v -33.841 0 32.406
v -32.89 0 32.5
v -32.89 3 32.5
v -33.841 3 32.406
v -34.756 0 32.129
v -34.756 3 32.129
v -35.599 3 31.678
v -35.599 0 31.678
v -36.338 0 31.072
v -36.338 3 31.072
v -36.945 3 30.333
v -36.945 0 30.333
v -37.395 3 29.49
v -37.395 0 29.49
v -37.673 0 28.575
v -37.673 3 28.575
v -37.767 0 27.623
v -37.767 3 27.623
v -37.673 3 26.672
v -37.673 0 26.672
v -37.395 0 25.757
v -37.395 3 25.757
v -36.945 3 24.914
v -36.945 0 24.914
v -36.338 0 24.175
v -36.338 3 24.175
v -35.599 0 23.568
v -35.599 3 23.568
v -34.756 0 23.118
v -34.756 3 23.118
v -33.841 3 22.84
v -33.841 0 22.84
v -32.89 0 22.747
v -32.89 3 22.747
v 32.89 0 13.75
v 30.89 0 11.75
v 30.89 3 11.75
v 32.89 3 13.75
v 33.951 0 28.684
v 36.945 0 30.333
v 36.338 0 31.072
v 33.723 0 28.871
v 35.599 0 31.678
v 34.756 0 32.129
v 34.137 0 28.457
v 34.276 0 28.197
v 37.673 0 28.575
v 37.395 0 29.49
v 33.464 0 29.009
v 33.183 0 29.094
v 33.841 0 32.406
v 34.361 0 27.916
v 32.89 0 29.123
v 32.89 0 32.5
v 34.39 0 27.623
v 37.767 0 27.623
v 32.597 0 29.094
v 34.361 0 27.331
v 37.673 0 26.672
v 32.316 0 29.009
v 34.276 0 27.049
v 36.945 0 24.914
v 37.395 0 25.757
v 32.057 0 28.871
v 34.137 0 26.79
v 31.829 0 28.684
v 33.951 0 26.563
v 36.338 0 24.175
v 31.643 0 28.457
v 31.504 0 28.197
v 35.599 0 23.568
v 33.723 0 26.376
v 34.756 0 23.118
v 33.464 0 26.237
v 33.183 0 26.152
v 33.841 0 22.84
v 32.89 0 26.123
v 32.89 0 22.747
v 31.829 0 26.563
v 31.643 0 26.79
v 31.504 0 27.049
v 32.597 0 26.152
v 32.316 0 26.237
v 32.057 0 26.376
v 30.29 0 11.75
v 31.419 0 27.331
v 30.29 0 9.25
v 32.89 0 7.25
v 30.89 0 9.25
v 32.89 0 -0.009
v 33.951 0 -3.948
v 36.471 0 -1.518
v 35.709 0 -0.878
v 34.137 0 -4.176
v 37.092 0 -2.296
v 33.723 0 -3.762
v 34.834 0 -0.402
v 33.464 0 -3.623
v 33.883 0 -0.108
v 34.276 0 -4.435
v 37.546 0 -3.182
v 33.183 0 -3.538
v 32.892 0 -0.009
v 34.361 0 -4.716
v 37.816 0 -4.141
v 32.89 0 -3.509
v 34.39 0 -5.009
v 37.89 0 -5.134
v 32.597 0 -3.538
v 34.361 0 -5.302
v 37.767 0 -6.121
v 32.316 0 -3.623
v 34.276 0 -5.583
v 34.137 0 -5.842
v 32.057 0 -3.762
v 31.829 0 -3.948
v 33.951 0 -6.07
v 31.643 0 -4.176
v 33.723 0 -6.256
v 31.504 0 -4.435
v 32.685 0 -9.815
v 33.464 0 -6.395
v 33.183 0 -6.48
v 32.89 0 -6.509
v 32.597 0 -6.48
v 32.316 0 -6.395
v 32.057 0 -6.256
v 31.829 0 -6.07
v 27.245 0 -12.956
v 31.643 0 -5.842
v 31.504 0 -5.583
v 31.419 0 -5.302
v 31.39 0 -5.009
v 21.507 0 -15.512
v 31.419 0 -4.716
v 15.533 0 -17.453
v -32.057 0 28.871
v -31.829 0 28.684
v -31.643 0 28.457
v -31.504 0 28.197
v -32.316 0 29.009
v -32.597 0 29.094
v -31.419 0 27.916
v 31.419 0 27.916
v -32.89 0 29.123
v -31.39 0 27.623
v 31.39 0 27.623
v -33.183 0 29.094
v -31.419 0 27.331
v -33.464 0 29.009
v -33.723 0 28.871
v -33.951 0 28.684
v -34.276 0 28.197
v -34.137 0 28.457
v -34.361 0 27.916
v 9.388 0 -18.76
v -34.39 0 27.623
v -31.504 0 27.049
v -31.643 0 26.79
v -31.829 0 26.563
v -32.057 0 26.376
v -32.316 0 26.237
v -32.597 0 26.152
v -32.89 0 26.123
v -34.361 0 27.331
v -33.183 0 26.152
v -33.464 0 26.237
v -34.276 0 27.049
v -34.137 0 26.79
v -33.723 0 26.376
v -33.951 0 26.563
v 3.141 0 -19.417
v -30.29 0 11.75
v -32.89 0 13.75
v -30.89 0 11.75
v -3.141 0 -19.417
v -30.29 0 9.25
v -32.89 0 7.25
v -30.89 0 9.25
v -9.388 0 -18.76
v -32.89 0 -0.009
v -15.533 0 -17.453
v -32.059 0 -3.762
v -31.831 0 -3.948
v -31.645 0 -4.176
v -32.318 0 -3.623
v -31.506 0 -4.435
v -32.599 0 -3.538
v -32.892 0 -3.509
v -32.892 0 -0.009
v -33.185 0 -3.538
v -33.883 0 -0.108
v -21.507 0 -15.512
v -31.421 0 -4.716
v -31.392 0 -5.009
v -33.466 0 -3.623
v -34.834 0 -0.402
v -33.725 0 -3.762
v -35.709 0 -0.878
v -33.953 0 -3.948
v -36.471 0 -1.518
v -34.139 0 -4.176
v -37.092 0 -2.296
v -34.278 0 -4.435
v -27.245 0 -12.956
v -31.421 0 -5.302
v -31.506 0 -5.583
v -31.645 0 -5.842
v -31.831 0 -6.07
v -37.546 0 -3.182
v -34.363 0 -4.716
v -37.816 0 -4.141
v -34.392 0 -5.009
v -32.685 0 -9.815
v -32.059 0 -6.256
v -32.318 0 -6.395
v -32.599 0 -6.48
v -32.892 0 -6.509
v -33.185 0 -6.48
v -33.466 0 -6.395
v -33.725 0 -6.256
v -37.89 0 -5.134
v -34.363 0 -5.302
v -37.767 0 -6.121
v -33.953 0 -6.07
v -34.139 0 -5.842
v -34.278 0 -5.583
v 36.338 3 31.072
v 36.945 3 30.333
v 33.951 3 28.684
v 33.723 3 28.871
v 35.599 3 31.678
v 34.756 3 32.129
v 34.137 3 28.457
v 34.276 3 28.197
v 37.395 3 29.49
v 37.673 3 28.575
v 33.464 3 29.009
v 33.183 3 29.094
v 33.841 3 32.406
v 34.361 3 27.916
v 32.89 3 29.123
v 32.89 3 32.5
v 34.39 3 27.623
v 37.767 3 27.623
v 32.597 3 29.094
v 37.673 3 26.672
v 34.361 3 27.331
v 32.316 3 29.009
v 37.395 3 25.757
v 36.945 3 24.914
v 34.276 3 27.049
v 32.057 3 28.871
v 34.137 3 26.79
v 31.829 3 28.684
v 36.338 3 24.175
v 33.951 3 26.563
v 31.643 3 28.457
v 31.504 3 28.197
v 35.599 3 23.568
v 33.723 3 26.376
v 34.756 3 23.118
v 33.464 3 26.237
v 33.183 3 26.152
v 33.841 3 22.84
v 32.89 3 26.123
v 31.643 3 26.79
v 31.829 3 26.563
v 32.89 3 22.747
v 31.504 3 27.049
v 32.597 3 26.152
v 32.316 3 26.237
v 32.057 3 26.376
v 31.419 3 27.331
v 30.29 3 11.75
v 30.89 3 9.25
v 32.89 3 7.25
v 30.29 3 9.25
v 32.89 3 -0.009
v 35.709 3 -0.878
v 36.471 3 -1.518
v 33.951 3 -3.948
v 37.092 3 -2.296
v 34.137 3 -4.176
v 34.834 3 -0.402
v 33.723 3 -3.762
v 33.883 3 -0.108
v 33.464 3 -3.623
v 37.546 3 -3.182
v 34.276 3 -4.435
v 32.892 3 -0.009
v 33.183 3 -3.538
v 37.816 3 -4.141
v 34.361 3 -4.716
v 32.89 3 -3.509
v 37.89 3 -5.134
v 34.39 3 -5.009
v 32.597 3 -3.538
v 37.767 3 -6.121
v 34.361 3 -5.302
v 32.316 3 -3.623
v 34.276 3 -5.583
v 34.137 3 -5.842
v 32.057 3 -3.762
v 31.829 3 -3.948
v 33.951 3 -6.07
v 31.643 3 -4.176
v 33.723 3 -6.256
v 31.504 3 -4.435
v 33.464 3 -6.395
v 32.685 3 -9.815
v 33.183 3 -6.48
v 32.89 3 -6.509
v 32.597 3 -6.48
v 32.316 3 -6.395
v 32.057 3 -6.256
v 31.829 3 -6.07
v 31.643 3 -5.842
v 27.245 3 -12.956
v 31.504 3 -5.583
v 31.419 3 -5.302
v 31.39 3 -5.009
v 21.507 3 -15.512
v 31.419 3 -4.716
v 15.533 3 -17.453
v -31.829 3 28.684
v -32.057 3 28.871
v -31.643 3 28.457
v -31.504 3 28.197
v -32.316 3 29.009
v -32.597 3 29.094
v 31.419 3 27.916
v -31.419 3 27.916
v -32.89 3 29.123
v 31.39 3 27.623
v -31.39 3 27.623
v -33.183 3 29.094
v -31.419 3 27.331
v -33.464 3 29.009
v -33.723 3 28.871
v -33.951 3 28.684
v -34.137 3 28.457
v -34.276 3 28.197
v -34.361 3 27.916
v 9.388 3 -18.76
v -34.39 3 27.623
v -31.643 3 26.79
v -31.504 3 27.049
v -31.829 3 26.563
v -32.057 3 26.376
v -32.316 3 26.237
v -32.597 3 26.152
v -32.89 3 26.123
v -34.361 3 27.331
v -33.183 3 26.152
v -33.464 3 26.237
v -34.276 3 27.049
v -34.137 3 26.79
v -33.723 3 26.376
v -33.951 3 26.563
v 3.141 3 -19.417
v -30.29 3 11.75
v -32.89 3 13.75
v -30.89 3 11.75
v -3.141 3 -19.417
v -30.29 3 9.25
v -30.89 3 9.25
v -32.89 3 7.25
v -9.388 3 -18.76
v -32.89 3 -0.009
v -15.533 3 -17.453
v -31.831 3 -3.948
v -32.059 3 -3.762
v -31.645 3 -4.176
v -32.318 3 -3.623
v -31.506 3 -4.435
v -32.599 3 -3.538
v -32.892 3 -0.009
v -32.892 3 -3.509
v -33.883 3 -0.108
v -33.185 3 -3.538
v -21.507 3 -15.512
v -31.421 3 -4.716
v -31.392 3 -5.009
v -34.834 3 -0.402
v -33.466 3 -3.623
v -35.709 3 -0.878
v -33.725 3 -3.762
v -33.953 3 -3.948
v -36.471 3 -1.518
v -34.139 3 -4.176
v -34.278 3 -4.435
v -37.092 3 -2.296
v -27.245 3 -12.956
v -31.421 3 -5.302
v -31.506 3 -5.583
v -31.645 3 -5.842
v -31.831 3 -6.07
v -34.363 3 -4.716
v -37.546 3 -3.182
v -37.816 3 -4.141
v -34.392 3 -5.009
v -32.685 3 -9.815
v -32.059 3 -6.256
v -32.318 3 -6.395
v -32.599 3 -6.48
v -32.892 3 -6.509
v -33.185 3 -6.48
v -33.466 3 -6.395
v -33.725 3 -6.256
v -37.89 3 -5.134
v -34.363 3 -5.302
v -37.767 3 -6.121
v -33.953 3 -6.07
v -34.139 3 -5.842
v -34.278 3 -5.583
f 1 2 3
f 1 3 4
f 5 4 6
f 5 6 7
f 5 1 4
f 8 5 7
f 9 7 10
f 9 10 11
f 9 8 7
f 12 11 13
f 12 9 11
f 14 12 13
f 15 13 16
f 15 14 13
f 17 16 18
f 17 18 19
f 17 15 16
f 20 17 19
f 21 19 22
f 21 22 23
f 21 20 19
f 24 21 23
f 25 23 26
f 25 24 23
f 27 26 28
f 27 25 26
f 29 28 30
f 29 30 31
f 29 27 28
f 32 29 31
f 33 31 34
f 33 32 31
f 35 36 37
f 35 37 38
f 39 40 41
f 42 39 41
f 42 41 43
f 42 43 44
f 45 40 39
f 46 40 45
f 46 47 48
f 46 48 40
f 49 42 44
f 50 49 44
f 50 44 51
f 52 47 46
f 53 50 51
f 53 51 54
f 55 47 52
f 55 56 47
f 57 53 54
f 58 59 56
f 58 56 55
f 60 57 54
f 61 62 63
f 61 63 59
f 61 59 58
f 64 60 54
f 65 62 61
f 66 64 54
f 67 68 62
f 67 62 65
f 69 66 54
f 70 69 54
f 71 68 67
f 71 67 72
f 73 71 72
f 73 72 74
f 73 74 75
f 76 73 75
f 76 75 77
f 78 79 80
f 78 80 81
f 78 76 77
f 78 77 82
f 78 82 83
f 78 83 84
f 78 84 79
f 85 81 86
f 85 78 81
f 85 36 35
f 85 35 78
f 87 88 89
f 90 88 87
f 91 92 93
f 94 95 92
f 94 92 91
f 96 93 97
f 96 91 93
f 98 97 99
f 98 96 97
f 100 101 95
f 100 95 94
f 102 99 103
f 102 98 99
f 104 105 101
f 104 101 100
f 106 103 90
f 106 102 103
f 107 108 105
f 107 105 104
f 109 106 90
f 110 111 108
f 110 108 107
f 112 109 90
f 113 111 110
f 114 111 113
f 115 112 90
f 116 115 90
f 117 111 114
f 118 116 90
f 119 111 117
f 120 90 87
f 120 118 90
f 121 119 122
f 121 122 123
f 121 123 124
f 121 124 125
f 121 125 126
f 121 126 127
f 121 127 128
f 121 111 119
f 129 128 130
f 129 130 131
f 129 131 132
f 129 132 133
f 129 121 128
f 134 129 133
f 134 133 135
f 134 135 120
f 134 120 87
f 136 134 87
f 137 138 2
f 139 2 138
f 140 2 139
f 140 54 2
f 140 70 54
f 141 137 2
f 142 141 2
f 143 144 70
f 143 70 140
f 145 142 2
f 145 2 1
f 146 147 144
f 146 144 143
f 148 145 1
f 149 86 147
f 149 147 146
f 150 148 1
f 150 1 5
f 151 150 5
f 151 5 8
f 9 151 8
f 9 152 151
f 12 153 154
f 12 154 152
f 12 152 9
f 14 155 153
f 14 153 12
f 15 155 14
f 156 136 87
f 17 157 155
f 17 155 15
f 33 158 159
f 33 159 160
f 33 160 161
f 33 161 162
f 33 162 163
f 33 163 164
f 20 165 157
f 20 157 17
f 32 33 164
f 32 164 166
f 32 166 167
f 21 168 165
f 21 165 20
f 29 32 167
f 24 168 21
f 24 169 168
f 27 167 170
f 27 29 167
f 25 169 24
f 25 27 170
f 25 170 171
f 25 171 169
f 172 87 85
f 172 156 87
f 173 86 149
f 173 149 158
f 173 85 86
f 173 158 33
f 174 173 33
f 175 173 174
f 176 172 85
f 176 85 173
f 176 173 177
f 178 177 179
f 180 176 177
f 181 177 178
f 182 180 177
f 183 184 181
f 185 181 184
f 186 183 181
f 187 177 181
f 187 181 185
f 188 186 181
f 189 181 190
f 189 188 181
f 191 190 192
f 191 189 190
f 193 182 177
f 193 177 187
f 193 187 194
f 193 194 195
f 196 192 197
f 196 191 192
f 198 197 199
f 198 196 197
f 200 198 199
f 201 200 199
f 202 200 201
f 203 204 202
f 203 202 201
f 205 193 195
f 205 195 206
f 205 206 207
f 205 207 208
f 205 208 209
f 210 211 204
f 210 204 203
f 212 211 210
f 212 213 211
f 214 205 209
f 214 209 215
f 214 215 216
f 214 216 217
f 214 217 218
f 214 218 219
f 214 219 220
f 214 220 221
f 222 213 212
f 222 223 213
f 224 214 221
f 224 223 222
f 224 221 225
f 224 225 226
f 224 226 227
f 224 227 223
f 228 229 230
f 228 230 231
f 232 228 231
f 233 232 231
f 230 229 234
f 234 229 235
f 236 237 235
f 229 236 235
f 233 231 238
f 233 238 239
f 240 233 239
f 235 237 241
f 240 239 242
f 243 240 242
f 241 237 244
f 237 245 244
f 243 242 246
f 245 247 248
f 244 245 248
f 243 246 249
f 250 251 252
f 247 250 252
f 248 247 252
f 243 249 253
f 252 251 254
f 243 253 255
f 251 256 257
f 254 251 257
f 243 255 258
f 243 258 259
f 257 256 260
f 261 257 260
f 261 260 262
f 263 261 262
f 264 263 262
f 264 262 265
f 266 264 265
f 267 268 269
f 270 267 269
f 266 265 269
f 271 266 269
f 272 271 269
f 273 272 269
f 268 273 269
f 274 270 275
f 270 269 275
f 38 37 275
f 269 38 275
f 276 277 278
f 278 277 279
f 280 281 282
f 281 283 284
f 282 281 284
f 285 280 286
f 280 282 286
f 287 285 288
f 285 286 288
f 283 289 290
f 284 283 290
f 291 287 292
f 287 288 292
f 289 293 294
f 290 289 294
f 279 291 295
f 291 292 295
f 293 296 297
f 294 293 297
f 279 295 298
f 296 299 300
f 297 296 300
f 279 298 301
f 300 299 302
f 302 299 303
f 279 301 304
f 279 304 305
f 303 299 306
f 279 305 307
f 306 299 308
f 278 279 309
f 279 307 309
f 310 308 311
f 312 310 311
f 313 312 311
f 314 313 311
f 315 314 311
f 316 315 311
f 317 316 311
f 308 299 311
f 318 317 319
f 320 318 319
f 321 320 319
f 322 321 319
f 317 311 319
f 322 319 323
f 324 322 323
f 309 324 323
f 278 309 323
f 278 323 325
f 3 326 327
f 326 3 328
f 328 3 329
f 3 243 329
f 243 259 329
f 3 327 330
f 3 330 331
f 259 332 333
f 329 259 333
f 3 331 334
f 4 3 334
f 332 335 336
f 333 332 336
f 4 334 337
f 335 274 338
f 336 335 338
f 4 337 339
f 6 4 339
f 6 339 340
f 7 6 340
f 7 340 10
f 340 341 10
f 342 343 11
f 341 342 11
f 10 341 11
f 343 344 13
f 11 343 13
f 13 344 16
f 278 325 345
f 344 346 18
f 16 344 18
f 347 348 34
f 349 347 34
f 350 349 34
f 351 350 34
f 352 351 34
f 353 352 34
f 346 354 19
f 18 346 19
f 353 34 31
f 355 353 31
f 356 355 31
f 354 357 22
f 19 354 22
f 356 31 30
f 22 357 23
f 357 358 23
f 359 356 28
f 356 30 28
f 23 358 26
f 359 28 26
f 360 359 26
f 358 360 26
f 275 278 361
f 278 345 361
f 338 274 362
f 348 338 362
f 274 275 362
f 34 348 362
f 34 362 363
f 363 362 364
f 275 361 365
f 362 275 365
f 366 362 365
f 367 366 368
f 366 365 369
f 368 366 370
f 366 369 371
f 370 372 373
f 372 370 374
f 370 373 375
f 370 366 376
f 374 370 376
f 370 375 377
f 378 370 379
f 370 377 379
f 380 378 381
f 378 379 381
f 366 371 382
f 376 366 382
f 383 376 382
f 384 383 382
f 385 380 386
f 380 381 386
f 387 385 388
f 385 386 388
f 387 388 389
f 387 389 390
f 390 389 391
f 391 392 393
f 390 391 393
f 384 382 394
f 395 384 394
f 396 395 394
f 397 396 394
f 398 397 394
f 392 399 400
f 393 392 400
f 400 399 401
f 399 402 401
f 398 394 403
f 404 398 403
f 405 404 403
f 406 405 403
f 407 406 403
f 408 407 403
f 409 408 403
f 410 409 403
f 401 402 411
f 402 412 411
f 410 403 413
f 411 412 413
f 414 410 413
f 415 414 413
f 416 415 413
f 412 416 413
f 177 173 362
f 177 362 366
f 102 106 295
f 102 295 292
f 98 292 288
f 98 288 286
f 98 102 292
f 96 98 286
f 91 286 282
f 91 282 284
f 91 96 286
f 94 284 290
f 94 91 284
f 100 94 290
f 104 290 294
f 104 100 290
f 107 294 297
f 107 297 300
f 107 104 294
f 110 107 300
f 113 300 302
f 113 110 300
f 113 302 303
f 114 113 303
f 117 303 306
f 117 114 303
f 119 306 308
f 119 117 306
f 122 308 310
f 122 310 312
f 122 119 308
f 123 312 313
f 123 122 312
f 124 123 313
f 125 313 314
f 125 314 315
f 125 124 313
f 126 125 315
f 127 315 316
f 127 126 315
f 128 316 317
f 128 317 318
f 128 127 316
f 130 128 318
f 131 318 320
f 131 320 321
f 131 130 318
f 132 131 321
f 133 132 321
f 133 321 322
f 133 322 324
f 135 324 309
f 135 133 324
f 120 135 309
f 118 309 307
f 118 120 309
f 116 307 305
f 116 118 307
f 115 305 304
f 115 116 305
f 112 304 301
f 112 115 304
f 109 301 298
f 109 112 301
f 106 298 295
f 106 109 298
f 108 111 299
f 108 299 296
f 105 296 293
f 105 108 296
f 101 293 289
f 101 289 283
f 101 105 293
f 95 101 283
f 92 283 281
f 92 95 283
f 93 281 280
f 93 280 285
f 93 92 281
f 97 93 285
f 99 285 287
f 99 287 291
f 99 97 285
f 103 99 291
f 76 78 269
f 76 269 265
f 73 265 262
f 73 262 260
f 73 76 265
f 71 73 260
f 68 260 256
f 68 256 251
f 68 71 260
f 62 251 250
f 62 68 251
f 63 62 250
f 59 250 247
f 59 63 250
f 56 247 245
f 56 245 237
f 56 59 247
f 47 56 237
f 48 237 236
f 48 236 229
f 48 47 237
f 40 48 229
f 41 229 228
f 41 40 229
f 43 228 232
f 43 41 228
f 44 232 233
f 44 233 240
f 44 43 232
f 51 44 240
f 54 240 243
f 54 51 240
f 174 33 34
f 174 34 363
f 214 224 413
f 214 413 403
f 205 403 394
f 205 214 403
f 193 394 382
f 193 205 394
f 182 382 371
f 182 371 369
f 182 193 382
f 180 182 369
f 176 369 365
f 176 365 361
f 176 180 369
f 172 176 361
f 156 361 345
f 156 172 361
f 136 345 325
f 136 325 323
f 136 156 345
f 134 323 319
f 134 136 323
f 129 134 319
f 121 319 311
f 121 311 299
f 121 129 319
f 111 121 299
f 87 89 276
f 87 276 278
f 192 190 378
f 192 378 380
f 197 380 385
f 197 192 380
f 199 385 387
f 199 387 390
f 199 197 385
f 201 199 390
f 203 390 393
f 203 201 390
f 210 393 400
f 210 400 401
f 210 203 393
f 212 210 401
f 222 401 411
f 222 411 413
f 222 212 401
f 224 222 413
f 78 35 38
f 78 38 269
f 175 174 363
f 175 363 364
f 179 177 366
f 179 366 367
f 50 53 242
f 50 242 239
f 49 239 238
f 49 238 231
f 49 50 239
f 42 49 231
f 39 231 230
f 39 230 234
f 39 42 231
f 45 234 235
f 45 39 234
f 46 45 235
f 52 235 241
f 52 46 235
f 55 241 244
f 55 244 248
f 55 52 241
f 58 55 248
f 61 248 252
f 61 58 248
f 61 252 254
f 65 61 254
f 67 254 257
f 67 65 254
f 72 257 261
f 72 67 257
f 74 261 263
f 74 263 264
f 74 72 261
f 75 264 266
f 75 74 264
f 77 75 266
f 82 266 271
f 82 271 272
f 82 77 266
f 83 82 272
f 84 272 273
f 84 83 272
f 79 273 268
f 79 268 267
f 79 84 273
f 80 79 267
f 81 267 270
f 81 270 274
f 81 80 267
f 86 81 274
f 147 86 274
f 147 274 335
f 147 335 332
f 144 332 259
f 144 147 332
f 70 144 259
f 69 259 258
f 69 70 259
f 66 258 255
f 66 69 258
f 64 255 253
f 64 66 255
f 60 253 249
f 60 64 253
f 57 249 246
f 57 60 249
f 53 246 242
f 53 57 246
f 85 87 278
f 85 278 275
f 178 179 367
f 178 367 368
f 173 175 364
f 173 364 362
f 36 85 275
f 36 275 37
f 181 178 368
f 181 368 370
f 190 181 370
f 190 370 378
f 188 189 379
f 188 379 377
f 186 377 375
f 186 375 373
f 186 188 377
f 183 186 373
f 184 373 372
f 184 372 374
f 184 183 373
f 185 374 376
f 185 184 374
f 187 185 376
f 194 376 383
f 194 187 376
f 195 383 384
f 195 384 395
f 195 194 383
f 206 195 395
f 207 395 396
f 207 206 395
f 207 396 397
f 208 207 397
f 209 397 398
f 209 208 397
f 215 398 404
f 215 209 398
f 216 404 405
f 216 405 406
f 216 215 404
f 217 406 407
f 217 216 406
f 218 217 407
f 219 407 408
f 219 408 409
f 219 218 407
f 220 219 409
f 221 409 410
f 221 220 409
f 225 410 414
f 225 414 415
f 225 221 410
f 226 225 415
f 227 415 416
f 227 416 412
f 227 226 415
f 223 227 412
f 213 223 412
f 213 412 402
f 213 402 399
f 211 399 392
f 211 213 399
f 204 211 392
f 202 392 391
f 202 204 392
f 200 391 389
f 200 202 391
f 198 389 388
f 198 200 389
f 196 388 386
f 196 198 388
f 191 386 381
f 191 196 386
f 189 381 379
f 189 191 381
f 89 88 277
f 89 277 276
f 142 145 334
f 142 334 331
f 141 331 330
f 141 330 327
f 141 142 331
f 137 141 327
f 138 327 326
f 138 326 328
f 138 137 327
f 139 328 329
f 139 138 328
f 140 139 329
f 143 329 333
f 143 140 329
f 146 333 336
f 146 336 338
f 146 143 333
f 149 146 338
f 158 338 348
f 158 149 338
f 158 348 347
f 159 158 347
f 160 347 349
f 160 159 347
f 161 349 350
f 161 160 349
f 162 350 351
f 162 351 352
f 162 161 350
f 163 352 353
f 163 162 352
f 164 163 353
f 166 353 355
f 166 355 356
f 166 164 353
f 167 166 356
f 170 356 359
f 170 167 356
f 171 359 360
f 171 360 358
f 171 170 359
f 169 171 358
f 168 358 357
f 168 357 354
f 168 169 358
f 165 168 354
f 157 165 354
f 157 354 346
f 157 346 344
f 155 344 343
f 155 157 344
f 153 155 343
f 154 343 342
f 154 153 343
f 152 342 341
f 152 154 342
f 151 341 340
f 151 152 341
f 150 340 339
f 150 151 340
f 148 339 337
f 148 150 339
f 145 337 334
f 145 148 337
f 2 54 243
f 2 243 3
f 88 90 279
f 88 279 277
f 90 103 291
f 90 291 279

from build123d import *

# Parameters (mm, degrees)
CROQUIS1_R              = 1.5
SALIENTE_EXTRUIR1_DEPTH = 3


with BuildPart() as part:
    # Croquis1 → Saliente-Extruir1 (new body)
    with BuildSketch(Plane(origin=(0, 0, 0), x_dir=(1, 0, 0), z_dir=(0, 1, 0))):
        with BuildLine():
            Line((-32.89, -7.25), (-32.89, 0.008962831))
            Line((-32.89, 0.008962831), (-32.892040435, 0.008962415))
            ThreePointArc((-32.892040435, 0.008962415), (-36.801169554, 1.891477927), (-37.766700191, 6.121478601))
            ThreePointArc((-37.766700191, 6.121478601), (0, 19.498776441), (37.766700191, 6.121478601))
            ThreePointArc((37.766700191, 6.121478601), (36.801169554, 1.891477927), (32.892040435, 0.008962415))
            Line((32.892040435, 0.008962415), (32.89, 0.008962831))
            Line((32.89, 0.008962831), (32.89, -7.25))
            Line((32.89, -7.25), (30.89, -9.25))
            Line((30.89, -9.25), (30.29, -9.25))
            Line((30.29, -9.25), (30.29, -11.749506691))
            Line((30.29, -11.749506691), (30.89, -11.749506691))
            Line((30.89, -11.749506691), (32.89, -13.749506691))
            Line((32.89, -13.749506691), (32.89, -22.746599618))
            ThreePointArc((32.89, -22.746599618), (37.766700191, -27.623299809), (32.89, -32.5))
            Line((32.89, -32.5), (-32.89, -32.5))
            ThreePointArc((-32.89, -32.5), (-37.766700191, -27.623299809), (-32.89, -22.746599618))
            Line((-32.89, -22.746599618), (-32.89, -13.749506691))
            Line((-32.89, -13.749506691), (-30.89, -11.749506691))
            Line((-30.89, -11.749506691), (-30.29, -11.749506691))
            Line((-30.29, -11.749506691), (-30.29, -9.25))
            Line((-30.29, -9.25), (-30.89, -9.25))
            Line((-30.89, -9.25), (-32.89, -7.25))
        make_face()
        with Locations(Location((-32.892040435, 5.008962415, 0), (0, 0, 270))):
            Circle(CROQUIS1_R, mode=Mode.SUBTRACT)
        with Locations(Location((32.89, 5.008962415, 0), (0, 0, 270))):
            Circle(CROQUIS1_R, mode=Mode.SUBTRACT)
        with Locations(Location((-32.89, -27.623299809, 0), (0, 0, 270))):
            Circle(CROQUIS1_R, mode=Mode.SUBTRACT)
        with Locations(Location((32.89, -27.623299809, 0), (0, 0, 270))):
            Circle(CROQUIS1_R, mode=Mode.SUBTRACT)
    extrude(amount=SALIENTE_EXTRUIR1_DEPTH)


solid = part.part
